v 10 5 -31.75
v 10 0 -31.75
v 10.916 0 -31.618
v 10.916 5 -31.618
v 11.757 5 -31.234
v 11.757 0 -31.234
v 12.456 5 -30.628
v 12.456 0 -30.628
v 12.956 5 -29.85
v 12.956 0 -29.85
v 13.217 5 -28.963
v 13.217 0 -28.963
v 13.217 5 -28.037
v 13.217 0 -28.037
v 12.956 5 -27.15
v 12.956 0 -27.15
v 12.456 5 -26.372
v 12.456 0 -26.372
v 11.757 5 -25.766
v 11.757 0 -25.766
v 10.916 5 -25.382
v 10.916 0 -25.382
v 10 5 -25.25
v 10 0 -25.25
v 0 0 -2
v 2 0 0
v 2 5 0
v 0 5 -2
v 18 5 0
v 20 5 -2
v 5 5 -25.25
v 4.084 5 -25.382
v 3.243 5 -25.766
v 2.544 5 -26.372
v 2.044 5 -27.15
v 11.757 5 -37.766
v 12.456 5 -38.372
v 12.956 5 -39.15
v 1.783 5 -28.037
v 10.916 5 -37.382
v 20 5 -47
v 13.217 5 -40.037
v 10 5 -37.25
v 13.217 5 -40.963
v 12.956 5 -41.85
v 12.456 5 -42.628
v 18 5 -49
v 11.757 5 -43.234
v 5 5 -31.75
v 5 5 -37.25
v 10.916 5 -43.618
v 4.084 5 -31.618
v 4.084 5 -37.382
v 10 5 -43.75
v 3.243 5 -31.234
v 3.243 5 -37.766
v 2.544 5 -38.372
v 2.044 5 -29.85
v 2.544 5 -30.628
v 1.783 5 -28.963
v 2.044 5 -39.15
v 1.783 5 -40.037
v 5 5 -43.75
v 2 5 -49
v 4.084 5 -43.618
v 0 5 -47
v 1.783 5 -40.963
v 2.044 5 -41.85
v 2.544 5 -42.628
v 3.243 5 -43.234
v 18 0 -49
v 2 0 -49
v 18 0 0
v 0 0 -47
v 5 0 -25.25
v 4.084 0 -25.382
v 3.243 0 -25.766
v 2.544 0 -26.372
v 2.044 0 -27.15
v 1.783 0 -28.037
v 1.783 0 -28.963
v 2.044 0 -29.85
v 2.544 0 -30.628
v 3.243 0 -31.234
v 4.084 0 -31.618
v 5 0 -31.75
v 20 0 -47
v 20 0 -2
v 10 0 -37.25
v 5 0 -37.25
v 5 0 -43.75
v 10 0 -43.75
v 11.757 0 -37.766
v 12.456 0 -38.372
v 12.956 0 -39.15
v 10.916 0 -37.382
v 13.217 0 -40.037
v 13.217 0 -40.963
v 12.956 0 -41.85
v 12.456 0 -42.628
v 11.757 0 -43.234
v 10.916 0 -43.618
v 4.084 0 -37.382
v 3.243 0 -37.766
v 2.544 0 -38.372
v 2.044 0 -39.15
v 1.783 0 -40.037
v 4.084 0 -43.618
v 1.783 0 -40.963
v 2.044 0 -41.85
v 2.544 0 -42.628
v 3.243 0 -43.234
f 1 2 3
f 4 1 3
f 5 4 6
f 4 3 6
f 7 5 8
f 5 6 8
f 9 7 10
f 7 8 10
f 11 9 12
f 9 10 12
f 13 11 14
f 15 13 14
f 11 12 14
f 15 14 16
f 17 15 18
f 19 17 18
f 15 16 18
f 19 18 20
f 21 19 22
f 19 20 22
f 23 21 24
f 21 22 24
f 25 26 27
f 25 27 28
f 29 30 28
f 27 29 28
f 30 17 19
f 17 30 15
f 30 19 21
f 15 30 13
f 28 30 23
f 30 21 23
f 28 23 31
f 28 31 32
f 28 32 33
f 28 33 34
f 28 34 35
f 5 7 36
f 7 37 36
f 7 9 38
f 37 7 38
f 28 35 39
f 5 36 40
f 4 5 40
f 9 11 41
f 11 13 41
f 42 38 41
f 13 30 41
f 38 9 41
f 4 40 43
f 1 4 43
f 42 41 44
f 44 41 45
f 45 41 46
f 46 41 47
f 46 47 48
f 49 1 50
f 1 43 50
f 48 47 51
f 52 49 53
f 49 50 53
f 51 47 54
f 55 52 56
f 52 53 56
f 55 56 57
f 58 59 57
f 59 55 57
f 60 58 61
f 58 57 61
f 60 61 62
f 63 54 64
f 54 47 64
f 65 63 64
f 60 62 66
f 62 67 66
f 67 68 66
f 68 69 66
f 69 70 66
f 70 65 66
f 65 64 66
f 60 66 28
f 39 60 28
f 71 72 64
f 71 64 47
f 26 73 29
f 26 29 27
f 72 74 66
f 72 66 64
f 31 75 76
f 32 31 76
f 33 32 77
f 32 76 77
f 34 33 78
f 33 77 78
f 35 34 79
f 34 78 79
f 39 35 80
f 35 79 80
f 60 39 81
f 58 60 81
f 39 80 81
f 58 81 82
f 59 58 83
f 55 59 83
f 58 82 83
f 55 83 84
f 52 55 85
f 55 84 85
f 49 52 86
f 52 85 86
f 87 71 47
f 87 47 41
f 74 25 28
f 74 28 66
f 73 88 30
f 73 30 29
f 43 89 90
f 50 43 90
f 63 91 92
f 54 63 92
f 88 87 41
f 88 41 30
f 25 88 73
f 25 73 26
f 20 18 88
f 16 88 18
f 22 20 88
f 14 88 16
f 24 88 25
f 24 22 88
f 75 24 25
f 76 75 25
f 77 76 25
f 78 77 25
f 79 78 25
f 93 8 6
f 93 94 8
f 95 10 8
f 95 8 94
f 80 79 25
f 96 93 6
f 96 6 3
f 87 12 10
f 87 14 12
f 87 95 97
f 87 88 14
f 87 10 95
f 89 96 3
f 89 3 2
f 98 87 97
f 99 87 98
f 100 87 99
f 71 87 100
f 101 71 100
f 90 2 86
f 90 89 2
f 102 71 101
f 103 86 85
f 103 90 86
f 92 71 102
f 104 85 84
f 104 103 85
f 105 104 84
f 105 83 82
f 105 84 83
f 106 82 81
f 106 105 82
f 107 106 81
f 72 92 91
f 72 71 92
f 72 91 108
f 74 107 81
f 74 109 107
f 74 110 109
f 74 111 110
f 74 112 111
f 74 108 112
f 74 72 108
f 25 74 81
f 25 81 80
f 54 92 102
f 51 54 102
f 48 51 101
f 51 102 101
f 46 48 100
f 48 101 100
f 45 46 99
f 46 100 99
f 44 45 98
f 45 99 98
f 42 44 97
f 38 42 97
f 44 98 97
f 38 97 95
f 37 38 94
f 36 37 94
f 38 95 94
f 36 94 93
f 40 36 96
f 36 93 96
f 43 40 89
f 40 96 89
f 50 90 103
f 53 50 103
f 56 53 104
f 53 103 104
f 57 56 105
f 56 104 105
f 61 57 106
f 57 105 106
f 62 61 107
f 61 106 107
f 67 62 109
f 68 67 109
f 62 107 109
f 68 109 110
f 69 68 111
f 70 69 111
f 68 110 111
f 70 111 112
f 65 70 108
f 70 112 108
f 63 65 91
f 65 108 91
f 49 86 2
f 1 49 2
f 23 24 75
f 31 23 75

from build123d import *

# Parameters (mm, degrees)
BOSS_EXTRUDE1_DEPTH = 5
SKETCH1_5_OUTSIDE_W = 32.632
SKETCH1_5_OUTSIDE_H = 61.632
CUT_EXTRUDE5_DEPTH  = 5


with BuildPart() as part:
    # Sketch1 → Boss-Extrude1 (new body)
    with BuildSketch(Plane(origin=(0, 0, 0), x_dir=(1, 0, 0), z_dir=(0, 1, 0))):
        Polygon((0, 47), (2, 49), (18, 49), (20, 47), (20, 2), (18, 0), (2, 0), (0, 2), align=None)
    extrude(amount=BOSS_EXTRUDE1_DEPTH)

    # Sketch1<5> outside → Cut-Extrude5 (cut)
    # profile 1 of 3: a face of its own
    with BuildSketch(Plane(origin=(0, 0, 0), x_dir=(1, 0, 0), z_dir=(0, 1, 0))):
        with Locations((10, 24.5)):
            Rectangle(SKETCH1_5_OUTSIDE_W, SKETCH1_5_OUTSIDE_H)
        Polygon((0, 47), (2, 49), (18, 49), (20, 47), (20, 2), (18, 0), (2, 0), (0, 2), align=None, mode=Mode.SUBTRACT)
    # profile 2 of 3: a face of its own
    with BuildSketch(Plane(origin=(0, 0, 0), x_dir=(1, 0, 0), z_dir=(0, 1, 0))):
        with BuildLine():
            Line((10, 37.25), (5, 37.25))
            ThreePointArc((5, 37.25), (1.75, 40.5), (5, 43.75))
            Line((5, 43.75), (10, 43.75))
            ThreePointArc((10, 43.75), (13.25, 40.5), (10, 37.25))
        make_face()
    # profile 3 of 3: a face of its own
    with BuildSketch(Plane(origin=(0, 0, 0), x_dir=(1, 0, 0), z_dir=(0, 1, 0))):
        with BuildLine():
            Line((5, 31.75), (10, 31.75))
            ThreePointArc((10, 31.75), (13.25, 28.5), (10, 25.25))
            Line((10, 25.25), (5, 25.25))
            ThreePointArc((5, 25.25), (1.75, 28.5), (5, 31.75))
        make_face()
    extrude(amount=CUT_EXTRUDE5_DEPTH, mode=Mode.SUBTRACT)


solid = part.part
